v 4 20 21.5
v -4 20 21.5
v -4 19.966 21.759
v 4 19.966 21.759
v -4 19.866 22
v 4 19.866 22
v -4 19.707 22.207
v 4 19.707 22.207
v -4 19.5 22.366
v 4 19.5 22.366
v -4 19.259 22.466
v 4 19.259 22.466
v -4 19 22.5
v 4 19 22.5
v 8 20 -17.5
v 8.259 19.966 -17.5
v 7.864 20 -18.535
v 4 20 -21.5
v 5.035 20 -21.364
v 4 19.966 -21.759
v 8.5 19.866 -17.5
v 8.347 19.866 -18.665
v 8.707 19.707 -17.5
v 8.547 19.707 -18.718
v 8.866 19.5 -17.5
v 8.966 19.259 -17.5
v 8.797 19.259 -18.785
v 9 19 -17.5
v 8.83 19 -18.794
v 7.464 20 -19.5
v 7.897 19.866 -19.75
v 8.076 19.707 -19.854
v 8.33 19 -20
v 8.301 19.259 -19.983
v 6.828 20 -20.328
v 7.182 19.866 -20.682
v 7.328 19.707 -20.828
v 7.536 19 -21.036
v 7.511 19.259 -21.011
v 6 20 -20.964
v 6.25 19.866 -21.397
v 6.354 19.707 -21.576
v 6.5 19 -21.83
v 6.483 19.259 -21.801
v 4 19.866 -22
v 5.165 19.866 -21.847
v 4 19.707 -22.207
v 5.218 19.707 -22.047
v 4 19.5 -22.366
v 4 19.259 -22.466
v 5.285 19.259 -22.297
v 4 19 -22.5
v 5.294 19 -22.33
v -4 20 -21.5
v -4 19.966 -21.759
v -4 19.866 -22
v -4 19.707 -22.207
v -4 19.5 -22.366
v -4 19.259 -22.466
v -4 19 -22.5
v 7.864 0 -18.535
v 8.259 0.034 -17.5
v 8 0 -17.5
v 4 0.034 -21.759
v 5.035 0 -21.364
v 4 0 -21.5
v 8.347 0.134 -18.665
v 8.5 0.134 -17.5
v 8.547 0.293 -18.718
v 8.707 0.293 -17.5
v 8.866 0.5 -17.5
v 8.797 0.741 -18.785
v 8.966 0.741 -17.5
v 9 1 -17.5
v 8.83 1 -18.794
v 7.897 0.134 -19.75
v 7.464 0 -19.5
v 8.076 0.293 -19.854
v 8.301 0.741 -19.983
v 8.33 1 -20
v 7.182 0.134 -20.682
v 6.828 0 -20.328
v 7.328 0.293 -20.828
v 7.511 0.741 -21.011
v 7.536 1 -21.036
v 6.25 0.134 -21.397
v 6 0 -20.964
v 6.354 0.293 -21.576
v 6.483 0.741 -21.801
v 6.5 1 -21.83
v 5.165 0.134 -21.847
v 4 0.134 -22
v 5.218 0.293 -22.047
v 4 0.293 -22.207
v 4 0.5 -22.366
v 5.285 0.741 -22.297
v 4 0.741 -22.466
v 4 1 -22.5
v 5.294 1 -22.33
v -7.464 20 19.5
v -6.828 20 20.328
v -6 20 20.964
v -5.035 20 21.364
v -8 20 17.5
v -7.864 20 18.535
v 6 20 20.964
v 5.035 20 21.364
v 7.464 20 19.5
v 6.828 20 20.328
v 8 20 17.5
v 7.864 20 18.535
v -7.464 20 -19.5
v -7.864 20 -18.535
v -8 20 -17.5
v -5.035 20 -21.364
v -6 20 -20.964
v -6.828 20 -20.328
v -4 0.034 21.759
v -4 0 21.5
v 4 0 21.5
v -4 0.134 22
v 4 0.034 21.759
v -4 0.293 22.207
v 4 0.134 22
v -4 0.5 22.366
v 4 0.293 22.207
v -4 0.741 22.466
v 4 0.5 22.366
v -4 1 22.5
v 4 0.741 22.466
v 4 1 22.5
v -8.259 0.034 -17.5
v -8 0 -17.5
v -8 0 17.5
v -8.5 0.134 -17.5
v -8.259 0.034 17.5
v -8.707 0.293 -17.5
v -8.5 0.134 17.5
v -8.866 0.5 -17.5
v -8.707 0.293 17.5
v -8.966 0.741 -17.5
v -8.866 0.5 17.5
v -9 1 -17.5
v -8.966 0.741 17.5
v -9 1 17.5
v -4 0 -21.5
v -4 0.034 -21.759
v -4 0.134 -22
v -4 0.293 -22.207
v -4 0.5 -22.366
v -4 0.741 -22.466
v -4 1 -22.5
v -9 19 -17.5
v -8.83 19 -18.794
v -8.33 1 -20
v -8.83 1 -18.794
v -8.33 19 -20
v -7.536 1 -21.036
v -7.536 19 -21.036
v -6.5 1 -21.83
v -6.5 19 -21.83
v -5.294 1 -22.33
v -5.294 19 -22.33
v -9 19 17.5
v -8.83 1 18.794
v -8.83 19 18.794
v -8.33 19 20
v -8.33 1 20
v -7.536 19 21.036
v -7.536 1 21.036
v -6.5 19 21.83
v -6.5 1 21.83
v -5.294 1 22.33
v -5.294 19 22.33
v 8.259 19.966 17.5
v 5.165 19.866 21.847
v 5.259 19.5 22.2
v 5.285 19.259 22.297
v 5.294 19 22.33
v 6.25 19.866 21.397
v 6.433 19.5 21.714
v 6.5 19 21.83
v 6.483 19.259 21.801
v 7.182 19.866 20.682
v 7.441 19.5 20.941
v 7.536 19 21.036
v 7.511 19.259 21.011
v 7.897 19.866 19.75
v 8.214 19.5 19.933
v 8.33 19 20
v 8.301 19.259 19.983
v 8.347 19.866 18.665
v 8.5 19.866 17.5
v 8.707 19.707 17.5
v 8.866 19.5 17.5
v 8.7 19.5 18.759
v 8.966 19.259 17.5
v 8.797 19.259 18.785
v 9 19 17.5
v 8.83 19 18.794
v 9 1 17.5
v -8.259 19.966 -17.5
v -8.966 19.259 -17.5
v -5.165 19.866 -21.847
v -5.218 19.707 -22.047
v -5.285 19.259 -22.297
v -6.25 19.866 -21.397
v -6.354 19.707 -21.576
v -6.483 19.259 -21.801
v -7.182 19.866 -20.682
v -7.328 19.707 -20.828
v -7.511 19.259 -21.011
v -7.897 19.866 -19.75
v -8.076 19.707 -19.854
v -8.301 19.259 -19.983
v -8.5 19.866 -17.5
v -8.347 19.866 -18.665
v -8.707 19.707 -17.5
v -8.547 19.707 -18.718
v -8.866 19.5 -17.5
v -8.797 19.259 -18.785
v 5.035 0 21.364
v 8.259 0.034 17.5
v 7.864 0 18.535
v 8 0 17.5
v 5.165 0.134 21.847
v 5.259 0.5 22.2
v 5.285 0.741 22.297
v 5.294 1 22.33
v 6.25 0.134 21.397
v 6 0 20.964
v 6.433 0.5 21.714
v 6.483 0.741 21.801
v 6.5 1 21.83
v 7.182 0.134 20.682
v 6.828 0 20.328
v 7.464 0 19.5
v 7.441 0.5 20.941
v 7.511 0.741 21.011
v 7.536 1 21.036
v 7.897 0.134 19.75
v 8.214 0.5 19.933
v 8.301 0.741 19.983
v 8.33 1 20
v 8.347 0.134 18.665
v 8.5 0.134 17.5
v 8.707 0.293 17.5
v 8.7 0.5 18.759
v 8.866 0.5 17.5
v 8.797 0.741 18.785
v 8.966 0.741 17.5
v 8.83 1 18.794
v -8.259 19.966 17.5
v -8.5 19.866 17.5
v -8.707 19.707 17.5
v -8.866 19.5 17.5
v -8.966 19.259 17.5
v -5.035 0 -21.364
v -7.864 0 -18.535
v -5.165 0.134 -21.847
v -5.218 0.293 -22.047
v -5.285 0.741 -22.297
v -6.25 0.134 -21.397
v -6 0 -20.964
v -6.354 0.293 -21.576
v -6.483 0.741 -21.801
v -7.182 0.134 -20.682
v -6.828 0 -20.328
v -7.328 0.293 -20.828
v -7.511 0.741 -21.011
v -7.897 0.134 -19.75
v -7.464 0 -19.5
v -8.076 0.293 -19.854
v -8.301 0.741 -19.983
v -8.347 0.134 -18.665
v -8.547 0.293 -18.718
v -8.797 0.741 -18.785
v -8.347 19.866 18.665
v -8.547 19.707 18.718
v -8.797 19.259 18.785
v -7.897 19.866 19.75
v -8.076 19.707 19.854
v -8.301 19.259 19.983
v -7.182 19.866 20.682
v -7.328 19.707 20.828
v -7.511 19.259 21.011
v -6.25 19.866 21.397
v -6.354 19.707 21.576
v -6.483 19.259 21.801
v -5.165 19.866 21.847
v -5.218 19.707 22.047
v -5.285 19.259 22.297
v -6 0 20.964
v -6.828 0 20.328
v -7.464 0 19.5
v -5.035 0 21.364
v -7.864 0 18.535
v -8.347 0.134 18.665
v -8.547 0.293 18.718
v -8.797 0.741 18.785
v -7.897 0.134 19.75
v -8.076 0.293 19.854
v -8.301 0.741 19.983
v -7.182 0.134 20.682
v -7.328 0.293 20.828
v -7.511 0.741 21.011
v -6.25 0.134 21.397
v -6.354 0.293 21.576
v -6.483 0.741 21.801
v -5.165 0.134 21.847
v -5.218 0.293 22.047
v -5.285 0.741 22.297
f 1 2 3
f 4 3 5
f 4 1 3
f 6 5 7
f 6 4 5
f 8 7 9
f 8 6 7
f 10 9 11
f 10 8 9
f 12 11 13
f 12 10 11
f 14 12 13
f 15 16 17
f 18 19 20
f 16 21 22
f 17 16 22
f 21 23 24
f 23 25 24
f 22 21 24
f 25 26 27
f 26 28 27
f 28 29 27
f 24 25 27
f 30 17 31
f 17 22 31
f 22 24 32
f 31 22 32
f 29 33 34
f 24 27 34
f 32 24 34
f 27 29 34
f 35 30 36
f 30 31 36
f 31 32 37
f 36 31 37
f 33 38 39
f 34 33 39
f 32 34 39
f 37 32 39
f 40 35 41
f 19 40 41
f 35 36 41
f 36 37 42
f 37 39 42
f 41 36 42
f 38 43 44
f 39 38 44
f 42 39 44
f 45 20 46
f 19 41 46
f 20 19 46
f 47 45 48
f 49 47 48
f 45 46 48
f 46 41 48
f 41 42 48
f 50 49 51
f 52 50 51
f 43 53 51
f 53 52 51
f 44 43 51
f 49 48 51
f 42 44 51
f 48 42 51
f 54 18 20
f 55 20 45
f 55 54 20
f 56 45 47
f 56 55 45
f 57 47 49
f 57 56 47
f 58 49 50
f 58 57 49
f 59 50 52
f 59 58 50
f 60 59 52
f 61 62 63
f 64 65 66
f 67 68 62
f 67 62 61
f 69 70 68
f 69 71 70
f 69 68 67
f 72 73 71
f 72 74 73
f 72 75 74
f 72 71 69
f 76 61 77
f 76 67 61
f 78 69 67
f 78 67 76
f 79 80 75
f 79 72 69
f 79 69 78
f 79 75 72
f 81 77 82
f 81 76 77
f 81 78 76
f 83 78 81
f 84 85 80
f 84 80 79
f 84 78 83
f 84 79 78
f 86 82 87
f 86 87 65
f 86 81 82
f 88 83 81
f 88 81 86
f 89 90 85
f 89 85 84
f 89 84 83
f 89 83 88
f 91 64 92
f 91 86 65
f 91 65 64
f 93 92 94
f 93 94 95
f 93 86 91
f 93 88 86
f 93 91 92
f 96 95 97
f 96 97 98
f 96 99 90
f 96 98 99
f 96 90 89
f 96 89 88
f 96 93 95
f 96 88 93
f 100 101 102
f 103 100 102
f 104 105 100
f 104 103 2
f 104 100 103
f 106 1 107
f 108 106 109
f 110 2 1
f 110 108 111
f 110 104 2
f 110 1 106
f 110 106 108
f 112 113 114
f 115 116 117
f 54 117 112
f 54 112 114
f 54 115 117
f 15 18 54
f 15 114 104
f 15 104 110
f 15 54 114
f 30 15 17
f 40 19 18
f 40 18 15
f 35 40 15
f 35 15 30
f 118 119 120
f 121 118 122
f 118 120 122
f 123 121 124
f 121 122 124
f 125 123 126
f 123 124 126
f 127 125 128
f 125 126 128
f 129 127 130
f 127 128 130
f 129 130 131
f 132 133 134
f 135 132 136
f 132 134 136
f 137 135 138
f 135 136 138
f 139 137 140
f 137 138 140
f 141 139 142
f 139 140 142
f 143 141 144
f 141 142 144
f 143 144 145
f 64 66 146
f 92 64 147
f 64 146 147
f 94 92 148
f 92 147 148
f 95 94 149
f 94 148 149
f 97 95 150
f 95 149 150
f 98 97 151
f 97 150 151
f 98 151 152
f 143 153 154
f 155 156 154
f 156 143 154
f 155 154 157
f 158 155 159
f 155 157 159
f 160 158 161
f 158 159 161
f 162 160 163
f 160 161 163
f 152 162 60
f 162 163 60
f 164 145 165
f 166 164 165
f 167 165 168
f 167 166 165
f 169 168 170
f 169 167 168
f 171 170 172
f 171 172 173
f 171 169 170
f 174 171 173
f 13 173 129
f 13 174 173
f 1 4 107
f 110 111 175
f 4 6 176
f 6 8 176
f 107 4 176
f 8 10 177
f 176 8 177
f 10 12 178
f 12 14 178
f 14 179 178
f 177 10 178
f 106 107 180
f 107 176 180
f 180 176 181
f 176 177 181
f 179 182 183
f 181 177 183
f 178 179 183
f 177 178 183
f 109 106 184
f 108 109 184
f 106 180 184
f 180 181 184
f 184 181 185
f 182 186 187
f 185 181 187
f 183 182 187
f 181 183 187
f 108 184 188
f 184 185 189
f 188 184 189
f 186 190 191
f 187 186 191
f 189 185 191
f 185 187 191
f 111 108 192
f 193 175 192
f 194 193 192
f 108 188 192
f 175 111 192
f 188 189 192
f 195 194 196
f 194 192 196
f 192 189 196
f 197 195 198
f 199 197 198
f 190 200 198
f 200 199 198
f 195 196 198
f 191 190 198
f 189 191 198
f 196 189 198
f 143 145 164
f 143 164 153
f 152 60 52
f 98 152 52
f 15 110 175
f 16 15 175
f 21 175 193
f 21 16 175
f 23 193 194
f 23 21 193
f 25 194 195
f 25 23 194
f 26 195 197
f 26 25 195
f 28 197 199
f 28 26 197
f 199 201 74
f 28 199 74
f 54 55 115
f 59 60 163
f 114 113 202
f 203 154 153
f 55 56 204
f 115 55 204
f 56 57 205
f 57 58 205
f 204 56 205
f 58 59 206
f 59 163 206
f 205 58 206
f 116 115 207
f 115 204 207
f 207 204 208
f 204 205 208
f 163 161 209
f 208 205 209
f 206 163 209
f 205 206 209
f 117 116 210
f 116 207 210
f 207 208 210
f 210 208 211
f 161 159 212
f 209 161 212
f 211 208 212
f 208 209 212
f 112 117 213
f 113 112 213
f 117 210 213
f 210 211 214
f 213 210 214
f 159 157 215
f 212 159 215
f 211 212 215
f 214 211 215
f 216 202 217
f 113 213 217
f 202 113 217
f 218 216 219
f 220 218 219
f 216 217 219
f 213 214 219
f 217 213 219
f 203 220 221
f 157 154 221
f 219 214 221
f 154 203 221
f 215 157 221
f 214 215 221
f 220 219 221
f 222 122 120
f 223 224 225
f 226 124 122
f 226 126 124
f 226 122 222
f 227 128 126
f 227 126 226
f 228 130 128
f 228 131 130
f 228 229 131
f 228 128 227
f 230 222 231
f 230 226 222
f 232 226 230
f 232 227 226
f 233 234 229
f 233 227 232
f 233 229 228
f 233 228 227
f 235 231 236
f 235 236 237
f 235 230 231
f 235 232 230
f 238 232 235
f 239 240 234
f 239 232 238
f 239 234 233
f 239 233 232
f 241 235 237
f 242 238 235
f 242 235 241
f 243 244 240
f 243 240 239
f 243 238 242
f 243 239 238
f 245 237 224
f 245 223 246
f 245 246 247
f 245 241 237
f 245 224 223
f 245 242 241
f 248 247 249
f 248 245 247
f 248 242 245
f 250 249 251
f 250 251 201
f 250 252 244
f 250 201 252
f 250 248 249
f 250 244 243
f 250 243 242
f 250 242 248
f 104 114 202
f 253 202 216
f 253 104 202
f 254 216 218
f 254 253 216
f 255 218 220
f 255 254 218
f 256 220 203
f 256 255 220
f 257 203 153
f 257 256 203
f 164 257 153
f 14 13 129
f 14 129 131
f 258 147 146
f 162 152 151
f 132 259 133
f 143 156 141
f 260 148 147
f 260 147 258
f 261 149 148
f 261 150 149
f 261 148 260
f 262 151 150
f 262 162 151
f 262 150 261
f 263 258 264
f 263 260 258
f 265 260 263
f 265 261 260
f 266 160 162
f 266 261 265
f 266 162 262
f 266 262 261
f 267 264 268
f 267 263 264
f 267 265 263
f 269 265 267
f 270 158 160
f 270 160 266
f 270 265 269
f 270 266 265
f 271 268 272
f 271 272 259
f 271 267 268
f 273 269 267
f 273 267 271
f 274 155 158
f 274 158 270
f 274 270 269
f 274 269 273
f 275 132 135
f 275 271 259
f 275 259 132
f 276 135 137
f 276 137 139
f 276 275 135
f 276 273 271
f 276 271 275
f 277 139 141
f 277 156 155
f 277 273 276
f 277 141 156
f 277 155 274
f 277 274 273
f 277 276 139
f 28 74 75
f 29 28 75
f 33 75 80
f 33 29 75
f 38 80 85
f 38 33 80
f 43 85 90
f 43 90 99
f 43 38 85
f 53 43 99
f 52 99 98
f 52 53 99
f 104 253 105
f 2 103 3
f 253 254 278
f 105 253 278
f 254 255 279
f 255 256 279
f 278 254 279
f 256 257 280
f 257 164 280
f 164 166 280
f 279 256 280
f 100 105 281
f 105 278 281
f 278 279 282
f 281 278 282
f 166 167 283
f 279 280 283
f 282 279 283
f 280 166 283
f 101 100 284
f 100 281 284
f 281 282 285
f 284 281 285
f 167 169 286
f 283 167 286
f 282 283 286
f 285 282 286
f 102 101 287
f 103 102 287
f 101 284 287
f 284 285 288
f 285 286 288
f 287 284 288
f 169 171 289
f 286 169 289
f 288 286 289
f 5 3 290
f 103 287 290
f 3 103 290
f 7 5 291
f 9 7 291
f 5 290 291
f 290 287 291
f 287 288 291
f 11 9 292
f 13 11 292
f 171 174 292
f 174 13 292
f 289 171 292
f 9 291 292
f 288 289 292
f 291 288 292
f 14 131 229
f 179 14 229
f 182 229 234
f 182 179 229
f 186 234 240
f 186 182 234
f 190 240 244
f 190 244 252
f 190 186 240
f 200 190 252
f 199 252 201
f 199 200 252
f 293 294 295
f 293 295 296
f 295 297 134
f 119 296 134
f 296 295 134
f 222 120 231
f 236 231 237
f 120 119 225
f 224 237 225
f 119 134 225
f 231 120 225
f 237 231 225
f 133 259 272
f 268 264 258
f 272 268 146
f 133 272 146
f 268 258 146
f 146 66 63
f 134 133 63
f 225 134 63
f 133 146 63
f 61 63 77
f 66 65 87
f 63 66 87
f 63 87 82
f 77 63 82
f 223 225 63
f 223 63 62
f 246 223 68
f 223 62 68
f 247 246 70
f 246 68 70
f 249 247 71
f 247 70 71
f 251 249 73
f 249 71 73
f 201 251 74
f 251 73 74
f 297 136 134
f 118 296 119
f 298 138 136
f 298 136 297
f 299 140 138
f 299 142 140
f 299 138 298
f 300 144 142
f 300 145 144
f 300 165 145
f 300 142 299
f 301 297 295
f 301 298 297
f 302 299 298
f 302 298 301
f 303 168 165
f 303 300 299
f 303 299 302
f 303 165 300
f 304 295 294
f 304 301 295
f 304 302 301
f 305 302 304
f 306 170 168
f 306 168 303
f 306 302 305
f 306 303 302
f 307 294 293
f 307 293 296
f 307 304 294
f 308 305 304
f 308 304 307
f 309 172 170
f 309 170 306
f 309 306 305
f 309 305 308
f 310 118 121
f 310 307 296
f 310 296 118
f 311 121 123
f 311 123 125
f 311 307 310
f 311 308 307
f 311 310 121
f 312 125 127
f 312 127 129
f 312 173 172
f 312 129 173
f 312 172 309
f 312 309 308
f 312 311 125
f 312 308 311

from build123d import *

# Parameters (mm, degrees)
SKETCH1_W           = 18
SKETCH1_H           = 45
BOSS_EXTRUDE1_DEPTH = 20
FILLET1_R           = 5
FILLET2_R           = 1


with BuildPart() as part:
    # Sketch1 → Boss-Extrude1 (new body)
    with BuildSketch(Plane(origin=(0, 0, 0), x_dir=(1, 0, 0), z_dir=(0, 1, 0))):
        Rectangle(SKETCH1_W, SKETCH1_H)
    extrude(amount=BOSS_EXTRUDE1_DEPTH)

    # Fillet1
    fillet1_edges = [part.edges().sort_by_distance(p)[0] for p in [
        (-9, 10, -22.5),
        (9, 10, -22.5),
        (9, 10, 22.5),
        (-9, 10, 22.5),
    ]]
    fillet(fillet1_edges, radius=FILLET1_R)

    # Fillet2
    fillet2_edges = [part.edges().sort_by_distance(p)[0] for p in [
        (9, 0, 0),
        (9, 20, 0),
        (-9, 0, 0),
        (0, 0, -22.5),
        (0, 0, 22.5),
        (-7.535533906, 0, -21.035533906),
        (7.535533906, 0, -21.035533906),
        (-7.535533906, 0, 21.035533906),
        (7.535533906, 0, 21.035533906),
        (0, 20, 22.5),
        (-9, 20, 0),
        (0, 20, -22.5),
        (-7.535533906, 20, -21.035533906),
        (7.535533906, 20, -21.035533906),
        (-7.535533906, 20, 21.035533906),
        (7.535533906, 20, 21.035533906),
    ]]
    fillet(fillet2_edges, radius=FILLET2_R)


solid = part.part
